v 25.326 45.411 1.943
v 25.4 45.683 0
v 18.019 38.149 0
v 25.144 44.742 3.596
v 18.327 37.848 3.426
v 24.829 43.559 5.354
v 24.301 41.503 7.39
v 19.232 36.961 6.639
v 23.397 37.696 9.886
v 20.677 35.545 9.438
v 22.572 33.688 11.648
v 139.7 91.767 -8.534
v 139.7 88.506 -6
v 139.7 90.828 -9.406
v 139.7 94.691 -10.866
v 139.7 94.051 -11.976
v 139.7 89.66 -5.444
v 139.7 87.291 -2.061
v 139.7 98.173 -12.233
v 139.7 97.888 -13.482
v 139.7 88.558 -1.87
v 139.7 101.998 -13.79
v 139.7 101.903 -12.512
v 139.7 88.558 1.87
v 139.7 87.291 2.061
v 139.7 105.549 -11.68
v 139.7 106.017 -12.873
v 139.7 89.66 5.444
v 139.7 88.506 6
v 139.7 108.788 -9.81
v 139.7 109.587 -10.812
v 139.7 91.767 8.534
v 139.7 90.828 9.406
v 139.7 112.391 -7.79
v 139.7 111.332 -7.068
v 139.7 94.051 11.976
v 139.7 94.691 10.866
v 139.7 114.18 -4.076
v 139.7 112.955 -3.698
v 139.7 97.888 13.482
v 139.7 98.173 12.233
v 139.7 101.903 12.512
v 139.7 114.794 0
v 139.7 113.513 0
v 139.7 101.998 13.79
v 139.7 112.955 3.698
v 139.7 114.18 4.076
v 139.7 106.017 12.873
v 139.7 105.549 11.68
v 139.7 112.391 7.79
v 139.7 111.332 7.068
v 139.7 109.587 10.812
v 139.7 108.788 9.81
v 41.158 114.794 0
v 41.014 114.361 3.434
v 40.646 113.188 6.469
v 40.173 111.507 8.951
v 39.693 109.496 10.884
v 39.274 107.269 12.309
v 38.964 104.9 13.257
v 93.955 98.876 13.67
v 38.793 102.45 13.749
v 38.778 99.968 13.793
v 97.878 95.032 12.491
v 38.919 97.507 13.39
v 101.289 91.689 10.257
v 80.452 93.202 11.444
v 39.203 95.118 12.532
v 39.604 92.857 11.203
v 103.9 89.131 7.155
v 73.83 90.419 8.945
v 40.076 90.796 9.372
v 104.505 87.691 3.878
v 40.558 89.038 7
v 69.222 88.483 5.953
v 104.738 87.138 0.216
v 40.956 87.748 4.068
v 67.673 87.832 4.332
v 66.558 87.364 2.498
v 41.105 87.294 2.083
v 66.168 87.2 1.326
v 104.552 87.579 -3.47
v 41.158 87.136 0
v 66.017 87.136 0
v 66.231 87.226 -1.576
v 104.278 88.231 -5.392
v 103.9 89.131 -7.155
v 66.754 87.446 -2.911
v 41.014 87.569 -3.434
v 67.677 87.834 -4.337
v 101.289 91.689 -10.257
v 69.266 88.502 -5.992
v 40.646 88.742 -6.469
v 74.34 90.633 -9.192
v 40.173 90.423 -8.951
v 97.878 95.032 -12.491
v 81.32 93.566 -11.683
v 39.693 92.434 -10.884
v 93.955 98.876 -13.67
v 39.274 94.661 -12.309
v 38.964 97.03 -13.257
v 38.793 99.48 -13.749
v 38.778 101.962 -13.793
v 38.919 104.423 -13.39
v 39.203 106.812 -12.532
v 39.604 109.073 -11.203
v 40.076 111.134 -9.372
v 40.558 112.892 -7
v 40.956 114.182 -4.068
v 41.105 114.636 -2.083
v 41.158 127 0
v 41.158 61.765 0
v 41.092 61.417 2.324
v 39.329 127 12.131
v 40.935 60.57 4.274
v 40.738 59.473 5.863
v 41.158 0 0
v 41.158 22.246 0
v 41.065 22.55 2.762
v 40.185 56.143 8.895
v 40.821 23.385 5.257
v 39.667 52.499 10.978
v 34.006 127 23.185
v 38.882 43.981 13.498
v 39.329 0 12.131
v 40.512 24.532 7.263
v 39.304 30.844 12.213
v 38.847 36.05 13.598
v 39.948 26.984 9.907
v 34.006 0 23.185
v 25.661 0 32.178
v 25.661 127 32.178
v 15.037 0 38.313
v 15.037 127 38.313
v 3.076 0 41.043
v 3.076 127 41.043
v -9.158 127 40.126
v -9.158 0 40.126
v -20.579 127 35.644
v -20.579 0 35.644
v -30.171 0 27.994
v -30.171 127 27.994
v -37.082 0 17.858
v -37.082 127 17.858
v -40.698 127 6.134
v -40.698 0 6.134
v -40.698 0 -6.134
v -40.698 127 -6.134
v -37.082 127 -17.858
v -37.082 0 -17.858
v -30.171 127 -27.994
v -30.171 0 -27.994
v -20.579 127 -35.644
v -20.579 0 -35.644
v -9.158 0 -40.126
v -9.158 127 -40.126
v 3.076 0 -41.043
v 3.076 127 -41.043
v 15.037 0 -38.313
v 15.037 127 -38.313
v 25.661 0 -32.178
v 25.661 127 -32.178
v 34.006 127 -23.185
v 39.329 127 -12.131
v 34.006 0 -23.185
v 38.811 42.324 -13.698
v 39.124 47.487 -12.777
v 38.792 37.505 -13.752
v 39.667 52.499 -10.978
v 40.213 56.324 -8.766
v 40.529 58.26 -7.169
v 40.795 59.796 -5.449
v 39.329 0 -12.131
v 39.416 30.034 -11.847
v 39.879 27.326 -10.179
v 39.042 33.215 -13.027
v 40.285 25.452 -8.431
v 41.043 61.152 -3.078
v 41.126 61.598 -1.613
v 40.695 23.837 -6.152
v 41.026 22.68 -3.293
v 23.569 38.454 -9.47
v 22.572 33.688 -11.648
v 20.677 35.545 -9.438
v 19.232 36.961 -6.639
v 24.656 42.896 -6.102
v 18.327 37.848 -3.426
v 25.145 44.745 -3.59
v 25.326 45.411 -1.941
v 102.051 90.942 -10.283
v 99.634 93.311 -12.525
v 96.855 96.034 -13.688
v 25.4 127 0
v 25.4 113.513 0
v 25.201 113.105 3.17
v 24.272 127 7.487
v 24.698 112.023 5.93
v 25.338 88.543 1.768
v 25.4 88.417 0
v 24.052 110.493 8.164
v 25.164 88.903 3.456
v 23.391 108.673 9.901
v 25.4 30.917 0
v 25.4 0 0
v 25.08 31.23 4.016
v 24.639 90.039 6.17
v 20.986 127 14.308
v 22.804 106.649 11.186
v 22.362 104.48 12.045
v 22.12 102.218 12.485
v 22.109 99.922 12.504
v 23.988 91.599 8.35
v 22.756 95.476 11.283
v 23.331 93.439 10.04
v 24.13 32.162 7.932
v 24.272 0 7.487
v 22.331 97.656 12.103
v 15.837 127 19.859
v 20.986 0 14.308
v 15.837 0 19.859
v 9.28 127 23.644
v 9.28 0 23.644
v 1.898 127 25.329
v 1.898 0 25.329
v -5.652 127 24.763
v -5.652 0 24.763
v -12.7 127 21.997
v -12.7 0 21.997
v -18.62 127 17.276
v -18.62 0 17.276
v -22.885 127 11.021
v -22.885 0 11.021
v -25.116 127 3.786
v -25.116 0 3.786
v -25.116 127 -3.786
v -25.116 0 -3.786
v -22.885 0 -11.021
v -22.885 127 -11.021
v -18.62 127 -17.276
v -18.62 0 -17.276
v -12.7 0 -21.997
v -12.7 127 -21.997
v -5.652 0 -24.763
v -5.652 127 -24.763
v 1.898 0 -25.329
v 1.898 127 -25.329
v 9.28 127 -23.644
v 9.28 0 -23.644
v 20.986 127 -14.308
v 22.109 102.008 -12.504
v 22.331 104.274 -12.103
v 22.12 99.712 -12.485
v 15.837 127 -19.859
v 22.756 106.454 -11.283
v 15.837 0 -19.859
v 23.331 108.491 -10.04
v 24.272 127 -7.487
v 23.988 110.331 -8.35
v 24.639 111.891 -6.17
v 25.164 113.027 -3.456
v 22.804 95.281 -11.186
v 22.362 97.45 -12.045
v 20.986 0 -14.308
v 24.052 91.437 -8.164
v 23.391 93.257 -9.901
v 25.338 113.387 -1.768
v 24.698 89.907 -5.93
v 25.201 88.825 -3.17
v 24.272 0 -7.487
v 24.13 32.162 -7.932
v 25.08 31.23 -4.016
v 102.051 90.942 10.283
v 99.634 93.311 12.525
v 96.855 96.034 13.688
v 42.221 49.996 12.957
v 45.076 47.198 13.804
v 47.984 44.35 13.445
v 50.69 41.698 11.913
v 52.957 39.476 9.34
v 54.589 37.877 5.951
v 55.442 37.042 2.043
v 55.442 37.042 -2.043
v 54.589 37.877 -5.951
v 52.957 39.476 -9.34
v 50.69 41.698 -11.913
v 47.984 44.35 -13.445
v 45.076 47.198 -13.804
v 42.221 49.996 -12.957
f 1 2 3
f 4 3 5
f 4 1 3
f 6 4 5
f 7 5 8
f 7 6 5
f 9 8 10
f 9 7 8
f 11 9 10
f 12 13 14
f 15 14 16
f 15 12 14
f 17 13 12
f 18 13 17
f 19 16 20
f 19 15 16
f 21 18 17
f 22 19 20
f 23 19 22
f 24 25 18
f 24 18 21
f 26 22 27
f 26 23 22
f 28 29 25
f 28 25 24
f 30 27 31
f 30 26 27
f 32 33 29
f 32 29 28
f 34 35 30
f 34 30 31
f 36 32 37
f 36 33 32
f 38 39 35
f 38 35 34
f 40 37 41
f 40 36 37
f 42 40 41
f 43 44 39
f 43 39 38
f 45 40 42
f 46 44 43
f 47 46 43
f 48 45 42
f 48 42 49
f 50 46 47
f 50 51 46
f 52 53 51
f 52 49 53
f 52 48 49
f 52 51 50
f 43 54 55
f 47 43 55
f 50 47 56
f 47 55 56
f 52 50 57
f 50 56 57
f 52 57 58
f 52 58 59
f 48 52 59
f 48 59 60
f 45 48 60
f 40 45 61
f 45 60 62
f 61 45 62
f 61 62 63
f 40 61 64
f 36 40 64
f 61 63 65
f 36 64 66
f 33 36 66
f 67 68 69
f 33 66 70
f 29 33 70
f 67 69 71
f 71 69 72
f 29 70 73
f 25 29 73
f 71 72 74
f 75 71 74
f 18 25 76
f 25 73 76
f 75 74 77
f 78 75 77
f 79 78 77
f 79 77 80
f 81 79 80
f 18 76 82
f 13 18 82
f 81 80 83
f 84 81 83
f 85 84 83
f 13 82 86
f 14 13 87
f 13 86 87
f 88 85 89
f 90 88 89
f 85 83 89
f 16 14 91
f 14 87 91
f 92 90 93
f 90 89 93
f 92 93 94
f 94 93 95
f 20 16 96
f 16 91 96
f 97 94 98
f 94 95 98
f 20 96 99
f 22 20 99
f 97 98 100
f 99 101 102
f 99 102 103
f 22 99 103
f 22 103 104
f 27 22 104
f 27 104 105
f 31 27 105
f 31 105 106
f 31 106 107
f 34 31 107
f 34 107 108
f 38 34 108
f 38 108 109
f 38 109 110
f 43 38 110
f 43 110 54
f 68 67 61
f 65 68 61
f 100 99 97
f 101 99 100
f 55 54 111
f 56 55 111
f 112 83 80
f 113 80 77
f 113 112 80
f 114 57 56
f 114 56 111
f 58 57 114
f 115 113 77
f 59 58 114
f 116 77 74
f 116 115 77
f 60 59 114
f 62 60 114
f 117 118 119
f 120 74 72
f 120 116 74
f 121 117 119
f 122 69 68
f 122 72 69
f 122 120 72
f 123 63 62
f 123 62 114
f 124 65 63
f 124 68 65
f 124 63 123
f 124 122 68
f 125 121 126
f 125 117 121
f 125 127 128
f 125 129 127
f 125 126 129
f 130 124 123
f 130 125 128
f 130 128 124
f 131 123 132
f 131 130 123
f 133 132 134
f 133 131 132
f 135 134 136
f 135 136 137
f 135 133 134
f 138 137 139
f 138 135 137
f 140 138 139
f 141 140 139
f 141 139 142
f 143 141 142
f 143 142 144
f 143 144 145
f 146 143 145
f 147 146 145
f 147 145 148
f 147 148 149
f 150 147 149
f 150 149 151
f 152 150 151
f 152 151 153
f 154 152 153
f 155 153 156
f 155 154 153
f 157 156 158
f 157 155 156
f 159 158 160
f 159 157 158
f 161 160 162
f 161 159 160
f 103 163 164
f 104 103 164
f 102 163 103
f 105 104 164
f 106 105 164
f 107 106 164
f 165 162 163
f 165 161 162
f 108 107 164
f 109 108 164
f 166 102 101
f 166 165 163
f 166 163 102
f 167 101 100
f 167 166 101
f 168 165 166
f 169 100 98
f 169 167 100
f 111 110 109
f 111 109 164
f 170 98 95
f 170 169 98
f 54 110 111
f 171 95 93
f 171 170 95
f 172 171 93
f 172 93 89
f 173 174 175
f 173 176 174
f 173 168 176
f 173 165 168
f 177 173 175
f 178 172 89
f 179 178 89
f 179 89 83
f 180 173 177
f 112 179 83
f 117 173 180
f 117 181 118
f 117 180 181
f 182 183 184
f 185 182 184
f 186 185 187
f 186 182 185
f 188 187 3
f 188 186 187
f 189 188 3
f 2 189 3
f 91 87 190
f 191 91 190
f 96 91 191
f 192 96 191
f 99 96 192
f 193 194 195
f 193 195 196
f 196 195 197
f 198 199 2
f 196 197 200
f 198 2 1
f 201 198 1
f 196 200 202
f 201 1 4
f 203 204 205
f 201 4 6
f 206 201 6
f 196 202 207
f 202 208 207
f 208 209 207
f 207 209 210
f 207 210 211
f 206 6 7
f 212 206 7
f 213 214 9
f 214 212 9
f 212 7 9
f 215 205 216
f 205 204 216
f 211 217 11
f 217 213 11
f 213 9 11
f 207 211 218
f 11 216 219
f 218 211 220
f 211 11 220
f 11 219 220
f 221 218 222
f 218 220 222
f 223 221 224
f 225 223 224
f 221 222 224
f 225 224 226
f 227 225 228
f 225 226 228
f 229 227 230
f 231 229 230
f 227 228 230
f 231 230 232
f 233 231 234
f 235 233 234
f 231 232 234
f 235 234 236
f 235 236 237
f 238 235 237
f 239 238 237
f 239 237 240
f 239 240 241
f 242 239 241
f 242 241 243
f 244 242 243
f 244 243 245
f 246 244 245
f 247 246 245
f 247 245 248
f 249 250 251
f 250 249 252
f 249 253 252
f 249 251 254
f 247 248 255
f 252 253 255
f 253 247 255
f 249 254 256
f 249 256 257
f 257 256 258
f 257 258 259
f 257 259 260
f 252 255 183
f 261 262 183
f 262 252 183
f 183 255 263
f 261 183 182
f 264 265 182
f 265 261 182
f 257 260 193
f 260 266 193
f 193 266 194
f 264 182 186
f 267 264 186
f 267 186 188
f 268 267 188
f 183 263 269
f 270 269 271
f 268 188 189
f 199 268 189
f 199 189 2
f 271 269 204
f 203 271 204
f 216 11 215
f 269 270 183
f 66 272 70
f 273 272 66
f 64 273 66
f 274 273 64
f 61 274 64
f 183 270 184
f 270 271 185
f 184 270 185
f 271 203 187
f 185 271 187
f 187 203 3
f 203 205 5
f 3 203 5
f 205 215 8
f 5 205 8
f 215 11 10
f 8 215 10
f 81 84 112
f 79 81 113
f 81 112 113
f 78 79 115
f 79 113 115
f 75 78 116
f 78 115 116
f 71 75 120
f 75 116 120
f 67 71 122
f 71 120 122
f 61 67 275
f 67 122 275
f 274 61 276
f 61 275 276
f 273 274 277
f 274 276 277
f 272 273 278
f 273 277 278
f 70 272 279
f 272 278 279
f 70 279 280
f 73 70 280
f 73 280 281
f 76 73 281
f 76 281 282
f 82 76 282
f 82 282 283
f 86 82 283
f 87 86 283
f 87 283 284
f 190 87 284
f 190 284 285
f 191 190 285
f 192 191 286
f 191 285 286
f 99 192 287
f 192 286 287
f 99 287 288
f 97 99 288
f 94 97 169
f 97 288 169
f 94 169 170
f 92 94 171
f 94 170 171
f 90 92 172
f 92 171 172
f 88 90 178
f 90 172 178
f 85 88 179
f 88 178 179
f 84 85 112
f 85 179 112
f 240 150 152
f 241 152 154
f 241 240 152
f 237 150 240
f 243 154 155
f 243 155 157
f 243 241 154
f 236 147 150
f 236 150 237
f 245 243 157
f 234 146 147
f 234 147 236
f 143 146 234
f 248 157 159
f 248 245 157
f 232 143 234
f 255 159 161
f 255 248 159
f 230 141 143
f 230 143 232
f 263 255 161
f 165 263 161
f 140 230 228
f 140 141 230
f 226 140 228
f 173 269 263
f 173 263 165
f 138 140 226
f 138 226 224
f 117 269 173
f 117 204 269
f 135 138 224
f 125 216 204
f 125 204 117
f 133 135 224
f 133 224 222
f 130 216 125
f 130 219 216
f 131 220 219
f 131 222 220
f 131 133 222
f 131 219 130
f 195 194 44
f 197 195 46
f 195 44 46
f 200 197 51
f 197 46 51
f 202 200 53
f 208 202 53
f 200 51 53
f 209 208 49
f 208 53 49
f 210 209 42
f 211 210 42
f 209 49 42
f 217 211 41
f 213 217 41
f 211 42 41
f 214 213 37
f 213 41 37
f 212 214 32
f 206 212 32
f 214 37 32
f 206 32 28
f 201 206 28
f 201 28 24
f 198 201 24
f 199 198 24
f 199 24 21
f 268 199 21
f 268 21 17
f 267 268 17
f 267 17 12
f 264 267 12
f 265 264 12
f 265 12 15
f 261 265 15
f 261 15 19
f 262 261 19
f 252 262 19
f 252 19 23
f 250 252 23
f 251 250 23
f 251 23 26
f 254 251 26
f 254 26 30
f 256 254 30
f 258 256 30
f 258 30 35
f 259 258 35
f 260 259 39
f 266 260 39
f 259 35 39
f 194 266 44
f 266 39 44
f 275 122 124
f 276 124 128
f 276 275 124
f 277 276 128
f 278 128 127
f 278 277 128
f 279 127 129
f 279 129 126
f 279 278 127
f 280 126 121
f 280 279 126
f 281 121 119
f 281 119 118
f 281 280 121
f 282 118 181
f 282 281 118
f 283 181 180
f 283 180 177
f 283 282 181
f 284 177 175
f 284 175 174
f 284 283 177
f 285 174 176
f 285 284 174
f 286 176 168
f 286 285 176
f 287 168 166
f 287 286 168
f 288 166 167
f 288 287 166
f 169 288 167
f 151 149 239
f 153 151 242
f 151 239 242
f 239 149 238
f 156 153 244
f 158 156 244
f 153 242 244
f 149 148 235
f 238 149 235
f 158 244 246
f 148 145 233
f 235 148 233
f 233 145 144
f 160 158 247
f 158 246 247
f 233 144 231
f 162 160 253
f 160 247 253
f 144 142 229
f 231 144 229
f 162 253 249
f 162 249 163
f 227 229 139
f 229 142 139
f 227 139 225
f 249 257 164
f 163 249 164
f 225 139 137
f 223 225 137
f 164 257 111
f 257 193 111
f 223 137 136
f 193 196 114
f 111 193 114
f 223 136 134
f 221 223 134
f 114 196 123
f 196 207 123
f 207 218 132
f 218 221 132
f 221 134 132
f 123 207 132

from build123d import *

# Parameters (mm, degrees)
F0_R           = 41.15773508
F1_DEPTH       = 127
F2_R           = 13.8288894668
F3_DEPTH       = 139.7
F4_R           = 25.4
F5_DEPTH       = 127.0010001
F9_R           = 13.8288903
F10_DEPTH      = 71.12
F10_DEPTH_BACK = 25.4
F6_R           = 12.5475422144
F11_DEPTH      = 130.13189


with BuildPart() as f1:
    # F0 (on Front) → F1 (new body)
    with BuildSketch(Plane.XZ):
        Circle(F0_R)
    extrude(amount=-F1_DEPTH)

    # F2 (on Right) → F3 (join)
    with BuildSketch(Plane.YZ):
        with Locations((100.965000689, 0)):
            Circle(F2_R)
    extrude(amount=F3_DEPTH)

    # F4 (on face) → F5 (cut, through all)
    with BuildSketch(Plane.XZ):
        Circle(F4_R)
    extrude(amount=-F5_DEPTH, mode=Mode.SUBTRACT)

    # F9 (on line) → F10 (join, two sides)
    with BuildSketch(Plane(origin=(45.6729605794, 46.6137044132, 0), x_dir=(-0.7142777152, 0.6998623761, 0), z_dir=(0.6998623761, 0.7142777152, 0))) as f10_sk:
        Circle(F9_R)
    extrude(amount=F10_DEPTH)
    extrude(f10_sk.sketch, amount=-F10_DEPTH_BACK)

    # F6 (on face) → F11 (cut)
    with BuildSketch(Plane.YZ.offset(139.7)):
        with Locations((100.965000689, 0)):
            Circle(F6_R)
    extrude(amount=-F11_DEPTH, mode=Mode.SUBTRACT)


solid = f1.part
